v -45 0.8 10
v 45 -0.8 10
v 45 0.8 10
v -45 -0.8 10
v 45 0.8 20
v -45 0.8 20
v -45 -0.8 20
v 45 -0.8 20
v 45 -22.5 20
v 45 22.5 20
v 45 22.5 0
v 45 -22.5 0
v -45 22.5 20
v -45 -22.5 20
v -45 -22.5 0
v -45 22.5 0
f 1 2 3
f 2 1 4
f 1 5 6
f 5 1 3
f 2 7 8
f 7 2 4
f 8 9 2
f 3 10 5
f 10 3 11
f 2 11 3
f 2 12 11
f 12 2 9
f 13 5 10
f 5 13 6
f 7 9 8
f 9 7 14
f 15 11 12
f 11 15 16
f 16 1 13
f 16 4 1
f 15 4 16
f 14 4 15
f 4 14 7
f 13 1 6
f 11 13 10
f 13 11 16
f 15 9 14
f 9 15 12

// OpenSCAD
// Slide drying rack - holds 10 microscope slides standing upright on their long edge
// Print orientation: base block on the bed (z = 0), slots open upward (+Z)

// ---------------- Parameters ----------------
block_len    = 90;    // base block length along X (mm)
block_wid    = 45;    // base block width along Y (mm)
block_h      = 20;    // base block height along Z (mm)

slot_count   = 10;    // number of slide slots
slot_len     = 77;    // slot length along X (mm)
slot_w       = 1.6;   // slot width along Y (mm)
slot_depth   = 10;    // slot depth from top face (mm)
slot_pitch   = 3.5;   // centre-to-centre slot spacing along Y (mm)

eps          = 0.5;   // overshoot of cutters past the top face (mm)

$fn = 64;

// ---------------- Model ----------------
difference() {
    // Solid base block, centred in X and Y, sitting on z = 0
    translate([-block_len / 2, -block_wid / 2, 0])
        cube([block_len, block_wid, block_h]);

    // Parallel slots running along X, centred as a group in X and Y
    for (i = [0 : slot_count - 1]) {
        x = (i - (slot_count - 1) / 2) * slot_pitch;
        translate([x - slot_len / 2, -slot_w / 2, block_h - slot_depth])
            cube([slot_len, slot_w, slot_depth + eps]);
    }
}
